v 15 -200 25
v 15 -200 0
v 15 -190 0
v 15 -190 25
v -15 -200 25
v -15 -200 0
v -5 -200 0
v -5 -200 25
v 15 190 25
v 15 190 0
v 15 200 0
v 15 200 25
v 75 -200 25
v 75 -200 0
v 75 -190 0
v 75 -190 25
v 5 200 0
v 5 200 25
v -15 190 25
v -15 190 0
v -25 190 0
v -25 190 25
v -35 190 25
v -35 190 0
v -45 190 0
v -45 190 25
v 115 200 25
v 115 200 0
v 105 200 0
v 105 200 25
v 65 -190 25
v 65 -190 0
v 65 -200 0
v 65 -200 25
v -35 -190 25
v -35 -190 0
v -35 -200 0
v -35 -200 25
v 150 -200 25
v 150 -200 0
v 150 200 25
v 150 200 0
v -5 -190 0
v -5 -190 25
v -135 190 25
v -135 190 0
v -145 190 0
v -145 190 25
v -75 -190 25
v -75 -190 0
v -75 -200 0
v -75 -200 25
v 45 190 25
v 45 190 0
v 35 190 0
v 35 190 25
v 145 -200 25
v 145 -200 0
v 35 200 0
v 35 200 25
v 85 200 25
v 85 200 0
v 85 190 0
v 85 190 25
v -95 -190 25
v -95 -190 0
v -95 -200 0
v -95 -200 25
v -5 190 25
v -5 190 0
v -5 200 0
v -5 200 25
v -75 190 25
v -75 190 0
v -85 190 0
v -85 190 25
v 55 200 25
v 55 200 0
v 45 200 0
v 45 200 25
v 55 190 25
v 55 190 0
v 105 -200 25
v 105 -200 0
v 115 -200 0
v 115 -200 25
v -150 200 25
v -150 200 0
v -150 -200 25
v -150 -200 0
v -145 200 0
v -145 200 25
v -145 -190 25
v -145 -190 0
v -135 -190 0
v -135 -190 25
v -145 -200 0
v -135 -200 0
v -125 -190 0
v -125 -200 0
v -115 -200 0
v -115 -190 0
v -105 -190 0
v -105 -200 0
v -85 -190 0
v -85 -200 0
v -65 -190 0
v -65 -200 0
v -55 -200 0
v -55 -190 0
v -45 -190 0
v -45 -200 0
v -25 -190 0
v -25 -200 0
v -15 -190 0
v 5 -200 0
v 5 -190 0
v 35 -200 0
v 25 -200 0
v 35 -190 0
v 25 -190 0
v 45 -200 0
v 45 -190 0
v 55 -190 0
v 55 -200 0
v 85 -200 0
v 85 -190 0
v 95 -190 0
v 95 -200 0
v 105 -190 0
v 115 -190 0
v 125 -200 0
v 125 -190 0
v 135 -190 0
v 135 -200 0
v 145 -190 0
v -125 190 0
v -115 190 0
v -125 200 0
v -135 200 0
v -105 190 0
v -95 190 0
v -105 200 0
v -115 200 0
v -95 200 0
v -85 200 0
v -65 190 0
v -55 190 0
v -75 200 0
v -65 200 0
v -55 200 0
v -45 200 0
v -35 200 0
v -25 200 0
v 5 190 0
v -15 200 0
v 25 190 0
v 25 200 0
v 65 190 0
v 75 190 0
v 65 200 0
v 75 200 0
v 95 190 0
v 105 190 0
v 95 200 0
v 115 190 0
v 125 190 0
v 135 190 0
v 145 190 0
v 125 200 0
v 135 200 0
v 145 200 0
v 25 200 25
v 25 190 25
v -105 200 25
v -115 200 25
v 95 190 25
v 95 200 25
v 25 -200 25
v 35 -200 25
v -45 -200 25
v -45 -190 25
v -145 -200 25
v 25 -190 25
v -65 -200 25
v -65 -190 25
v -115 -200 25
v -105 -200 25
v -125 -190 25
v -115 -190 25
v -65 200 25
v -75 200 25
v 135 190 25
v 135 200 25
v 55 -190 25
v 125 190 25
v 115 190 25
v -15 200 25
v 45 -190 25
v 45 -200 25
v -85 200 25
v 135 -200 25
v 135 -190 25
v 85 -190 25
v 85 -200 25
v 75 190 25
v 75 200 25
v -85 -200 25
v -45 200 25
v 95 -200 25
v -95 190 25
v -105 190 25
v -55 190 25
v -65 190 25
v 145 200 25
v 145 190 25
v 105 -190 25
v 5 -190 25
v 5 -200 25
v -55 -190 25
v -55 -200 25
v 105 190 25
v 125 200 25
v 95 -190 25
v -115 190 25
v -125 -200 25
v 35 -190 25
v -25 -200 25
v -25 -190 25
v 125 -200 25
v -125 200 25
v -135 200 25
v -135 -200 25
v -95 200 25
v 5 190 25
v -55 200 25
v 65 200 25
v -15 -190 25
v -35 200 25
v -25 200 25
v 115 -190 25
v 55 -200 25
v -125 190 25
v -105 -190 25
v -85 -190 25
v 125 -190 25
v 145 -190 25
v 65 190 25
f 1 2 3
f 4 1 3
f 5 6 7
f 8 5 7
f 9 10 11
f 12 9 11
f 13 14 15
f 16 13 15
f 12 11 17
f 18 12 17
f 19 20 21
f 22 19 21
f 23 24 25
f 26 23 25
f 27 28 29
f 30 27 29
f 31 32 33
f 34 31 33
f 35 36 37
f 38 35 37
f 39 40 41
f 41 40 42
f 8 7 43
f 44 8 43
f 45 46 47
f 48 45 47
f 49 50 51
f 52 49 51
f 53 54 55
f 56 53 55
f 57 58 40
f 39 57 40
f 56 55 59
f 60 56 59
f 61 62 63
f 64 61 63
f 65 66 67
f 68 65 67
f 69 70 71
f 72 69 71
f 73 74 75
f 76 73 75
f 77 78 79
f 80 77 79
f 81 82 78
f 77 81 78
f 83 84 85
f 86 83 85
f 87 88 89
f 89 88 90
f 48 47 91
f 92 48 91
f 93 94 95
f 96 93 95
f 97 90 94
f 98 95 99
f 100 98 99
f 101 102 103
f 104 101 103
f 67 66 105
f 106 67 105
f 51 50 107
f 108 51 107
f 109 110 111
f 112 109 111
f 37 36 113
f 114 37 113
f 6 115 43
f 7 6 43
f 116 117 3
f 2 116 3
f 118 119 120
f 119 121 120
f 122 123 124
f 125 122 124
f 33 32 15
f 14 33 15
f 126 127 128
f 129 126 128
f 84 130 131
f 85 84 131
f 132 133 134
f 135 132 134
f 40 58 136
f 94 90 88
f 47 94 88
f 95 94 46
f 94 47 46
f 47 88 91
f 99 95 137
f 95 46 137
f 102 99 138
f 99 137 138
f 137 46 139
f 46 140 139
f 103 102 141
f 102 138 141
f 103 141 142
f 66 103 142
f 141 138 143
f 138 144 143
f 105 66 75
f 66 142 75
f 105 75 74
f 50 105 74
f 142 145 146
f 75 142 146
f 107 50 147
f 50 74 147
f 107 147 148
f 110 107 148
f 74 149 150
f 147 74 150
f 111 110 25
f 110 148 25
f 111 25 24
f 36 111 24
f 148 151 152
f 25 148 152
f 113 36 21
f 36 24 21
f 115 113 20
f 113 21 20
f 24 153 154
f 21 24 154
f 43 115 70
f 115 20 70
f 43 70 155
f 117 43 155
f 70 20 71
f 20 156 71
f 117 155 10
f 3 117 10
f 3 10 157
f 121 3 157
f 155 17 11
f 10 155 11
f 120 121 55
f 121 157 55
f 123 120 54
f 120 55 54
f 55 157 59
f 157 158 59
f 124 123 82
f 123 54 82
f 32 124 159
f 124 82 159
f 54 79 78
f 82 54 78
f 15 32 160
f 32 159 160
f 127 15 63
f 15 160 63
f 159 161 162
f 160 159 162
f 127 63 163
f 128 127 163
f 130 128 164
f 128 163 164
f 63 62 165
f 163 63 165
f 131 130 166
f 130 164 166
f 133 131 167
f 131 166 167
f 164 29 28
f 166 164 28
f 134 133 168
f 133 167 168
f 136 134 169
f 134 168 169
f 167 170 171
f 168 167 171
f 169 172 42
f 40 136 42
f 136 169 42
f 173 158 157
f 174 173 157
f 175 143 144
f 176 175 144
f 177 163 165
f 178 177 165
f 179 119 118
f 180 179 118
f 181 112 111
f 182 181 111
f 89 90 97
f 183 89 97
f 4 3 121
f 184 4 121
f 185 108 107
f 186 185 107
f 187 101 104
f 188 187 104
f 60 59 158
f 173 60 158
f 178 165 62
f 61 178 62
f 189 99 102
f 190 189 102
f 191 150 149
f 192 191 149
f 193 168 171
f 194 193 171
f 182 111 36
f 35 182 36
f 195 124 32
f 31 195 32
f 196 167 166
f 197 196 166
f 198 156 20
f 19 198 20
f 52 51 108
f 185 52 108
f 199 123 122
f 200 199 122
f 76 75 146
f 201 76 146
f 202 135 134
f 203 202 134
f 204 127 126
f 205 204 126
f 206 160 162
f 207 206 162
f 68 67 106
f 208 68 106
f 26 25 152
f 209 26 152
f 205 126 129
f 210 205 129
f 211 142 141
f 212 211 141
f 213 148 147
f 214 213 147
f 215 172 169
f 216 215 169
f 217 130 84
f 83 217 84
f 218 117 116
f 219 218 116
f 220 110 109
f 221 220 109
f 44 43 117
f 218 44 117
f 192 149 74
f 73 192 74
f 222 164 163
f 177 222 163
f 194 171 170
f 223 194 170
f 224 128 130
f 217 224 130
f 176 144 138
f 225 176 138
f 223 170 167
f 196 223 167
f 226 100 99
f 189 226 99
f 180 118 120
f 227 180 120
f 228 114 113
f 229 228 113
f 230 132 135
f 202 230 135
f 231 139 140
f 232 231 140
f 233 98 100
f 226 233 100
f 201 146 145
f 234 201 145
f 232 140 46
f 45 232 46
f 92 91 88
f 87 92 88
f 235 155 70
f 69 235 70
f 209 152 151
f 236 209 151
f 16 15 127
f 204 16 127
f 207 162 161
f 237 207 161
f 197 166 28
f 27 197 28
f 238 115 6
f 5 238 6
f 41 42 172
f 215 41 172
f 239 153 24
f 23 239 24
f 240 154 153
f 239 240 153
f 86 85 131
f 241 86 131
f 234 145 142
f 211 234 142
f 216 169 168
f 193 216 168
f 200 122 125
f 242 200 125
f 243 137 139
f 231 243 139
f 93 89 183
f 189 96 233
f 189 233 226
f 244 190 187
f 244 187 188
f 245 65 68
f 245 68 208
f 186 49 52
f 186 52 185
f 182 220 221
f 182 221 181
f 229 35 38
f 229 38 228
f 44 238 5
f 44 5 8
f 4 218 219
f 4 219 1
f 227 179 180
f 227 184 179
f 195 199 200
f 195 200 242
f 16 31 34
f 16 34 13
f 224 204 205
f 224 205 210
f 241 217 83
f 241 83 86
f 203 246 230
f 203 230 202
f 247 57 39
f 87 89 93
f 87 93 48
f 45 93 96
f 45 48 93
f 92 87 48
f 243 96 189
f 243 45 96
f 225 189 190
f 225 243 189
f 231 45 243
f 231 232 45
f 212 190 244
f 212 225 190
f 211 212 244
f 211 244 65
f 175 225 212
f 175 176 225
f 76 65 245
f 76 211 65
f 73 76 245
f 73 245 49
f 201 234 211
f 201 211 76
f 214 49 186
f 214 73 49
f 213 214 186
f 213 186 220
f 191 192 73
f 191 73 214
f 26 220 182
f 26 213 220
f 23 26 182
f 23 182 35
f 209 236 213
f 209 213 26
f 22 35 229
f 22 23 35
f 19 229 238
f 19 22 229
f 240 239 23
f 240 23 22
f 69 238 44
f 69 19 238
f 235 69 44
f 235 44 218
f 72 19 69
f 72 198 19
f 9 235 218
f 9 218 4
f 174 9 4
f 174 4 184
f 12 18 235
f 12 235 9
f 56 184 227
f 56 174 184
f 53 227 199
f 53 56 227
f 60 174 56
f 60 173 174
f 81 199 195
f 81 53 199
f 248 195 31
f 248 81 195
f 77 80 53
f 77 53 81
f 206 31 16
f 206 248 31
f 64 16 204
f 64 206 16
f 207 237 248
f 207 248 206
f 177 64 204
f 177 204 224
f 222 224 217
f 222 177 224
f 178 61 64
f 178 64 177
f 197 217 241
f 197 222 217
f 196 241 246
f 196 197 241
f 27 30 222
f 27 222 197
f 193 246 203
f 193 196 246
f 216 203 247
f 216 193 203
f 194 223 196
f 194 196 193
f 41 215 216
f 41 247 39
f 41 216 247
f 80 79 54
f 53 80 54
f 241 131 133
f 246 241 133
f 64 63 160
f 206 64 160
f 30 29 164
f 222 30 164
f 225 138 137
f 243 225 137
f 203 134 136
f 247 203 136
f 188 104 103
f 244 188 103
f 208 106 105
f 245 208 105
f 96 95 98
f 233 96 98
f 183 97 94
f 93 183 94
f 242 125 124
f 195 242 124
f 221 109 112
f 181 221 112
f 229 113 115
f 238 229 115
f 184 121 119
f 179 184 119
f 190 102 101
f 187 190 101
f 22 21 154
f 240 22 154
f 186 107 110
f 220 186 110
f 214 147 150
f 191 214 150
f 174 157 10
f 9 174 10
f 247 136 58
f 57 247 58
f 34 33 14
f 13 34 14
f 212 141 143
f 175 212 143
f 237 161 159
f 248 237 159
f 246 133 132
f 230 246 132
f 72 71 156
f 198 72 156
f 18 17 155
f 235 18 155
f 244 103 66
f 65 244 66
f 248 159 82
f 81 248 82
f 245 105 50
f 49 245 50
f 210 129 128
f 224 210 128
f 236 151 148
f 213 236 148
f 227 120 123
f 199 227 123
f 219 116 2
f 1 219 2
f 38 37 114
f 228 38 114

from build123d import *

# Parameters (mm, degrees)
F1_DEPTH = 25


with BuildPart() as f1:
    # F0 (on Top) → F1 (new body)
    with BuildSketch(Plane.XY):
        Polygon((145, -200), (150, -200), (150, 200), (145, 200), (145, 190), (135, 190), (135, 200), (125, 200), (125, 190), (115, 190), (115, 200), (105, 200), (105, 190), (95, 190), (95, 200), (85, 200), (85, 190), (75, 190), (75, 200), (65, 200), (65, 190), (55, 190), (55, 200), (45, 200), (45, 190), (35, 190), (35, 200), (25, 200), (25, 190), (15, 190), (15, 200), (5, 200), (5, 190), (-5, 190), (-5, 200), (-15, 200), (-15, 190), (-25, 190), (-25, 200), (-35, 200), (-35, 190), (-45, 190), (-45, 200), (-55, 200), (-55, 190), (-65, 190), (-65, 200), (-75, 200), (-75, 190), (-85, 190), (-85, 200), (-95, 200), (-95, 190), (-105, 190), (-105, 200), (-115, 200), (-115, 190), (-125, 190), (-125, 200), (-135, 200), (-135, 190), (-145, 190), (-145, 200), (-150, 200), (-150, -200), (-145, -200), (-145, -190), (-135, -190), (-135, -200), (-125, -200), (-125, -190), (-115, -190), (-115, -200), (-105, -200), (-105, -190), (-95, -190), (-95, -200), (-85, -200), (-85, -190), (-75, -190), (-75, -200), (-65, -200), (-65, -190), (-55, -190), (-55, -200), (-45, -200), (-45, -190), (-35, -190), (-35, -200), (-25, -200), (-25, -190), (-15, -190), (-15, -200), (-5, -200), (-5, -190), (5, -190), (5, -200), (15, -200), (15, -190), (25, -190), (25, -200), (35, -200), (35, -190), (45, -190), (45, -200), (55, -200), (55, -190), (65, -190), (65, -200), (75, -200), (75, -190), (85, -190), (85, -200), (95, -200), (95, -190), (105, -190), (105, -200), (115, -200), (115, -190), (125, -190), (125, -200), (135, -200), (135, -190), (145, -190), align=None)
    extrude(amount=F1_DEPTH)


solid = f1.part
